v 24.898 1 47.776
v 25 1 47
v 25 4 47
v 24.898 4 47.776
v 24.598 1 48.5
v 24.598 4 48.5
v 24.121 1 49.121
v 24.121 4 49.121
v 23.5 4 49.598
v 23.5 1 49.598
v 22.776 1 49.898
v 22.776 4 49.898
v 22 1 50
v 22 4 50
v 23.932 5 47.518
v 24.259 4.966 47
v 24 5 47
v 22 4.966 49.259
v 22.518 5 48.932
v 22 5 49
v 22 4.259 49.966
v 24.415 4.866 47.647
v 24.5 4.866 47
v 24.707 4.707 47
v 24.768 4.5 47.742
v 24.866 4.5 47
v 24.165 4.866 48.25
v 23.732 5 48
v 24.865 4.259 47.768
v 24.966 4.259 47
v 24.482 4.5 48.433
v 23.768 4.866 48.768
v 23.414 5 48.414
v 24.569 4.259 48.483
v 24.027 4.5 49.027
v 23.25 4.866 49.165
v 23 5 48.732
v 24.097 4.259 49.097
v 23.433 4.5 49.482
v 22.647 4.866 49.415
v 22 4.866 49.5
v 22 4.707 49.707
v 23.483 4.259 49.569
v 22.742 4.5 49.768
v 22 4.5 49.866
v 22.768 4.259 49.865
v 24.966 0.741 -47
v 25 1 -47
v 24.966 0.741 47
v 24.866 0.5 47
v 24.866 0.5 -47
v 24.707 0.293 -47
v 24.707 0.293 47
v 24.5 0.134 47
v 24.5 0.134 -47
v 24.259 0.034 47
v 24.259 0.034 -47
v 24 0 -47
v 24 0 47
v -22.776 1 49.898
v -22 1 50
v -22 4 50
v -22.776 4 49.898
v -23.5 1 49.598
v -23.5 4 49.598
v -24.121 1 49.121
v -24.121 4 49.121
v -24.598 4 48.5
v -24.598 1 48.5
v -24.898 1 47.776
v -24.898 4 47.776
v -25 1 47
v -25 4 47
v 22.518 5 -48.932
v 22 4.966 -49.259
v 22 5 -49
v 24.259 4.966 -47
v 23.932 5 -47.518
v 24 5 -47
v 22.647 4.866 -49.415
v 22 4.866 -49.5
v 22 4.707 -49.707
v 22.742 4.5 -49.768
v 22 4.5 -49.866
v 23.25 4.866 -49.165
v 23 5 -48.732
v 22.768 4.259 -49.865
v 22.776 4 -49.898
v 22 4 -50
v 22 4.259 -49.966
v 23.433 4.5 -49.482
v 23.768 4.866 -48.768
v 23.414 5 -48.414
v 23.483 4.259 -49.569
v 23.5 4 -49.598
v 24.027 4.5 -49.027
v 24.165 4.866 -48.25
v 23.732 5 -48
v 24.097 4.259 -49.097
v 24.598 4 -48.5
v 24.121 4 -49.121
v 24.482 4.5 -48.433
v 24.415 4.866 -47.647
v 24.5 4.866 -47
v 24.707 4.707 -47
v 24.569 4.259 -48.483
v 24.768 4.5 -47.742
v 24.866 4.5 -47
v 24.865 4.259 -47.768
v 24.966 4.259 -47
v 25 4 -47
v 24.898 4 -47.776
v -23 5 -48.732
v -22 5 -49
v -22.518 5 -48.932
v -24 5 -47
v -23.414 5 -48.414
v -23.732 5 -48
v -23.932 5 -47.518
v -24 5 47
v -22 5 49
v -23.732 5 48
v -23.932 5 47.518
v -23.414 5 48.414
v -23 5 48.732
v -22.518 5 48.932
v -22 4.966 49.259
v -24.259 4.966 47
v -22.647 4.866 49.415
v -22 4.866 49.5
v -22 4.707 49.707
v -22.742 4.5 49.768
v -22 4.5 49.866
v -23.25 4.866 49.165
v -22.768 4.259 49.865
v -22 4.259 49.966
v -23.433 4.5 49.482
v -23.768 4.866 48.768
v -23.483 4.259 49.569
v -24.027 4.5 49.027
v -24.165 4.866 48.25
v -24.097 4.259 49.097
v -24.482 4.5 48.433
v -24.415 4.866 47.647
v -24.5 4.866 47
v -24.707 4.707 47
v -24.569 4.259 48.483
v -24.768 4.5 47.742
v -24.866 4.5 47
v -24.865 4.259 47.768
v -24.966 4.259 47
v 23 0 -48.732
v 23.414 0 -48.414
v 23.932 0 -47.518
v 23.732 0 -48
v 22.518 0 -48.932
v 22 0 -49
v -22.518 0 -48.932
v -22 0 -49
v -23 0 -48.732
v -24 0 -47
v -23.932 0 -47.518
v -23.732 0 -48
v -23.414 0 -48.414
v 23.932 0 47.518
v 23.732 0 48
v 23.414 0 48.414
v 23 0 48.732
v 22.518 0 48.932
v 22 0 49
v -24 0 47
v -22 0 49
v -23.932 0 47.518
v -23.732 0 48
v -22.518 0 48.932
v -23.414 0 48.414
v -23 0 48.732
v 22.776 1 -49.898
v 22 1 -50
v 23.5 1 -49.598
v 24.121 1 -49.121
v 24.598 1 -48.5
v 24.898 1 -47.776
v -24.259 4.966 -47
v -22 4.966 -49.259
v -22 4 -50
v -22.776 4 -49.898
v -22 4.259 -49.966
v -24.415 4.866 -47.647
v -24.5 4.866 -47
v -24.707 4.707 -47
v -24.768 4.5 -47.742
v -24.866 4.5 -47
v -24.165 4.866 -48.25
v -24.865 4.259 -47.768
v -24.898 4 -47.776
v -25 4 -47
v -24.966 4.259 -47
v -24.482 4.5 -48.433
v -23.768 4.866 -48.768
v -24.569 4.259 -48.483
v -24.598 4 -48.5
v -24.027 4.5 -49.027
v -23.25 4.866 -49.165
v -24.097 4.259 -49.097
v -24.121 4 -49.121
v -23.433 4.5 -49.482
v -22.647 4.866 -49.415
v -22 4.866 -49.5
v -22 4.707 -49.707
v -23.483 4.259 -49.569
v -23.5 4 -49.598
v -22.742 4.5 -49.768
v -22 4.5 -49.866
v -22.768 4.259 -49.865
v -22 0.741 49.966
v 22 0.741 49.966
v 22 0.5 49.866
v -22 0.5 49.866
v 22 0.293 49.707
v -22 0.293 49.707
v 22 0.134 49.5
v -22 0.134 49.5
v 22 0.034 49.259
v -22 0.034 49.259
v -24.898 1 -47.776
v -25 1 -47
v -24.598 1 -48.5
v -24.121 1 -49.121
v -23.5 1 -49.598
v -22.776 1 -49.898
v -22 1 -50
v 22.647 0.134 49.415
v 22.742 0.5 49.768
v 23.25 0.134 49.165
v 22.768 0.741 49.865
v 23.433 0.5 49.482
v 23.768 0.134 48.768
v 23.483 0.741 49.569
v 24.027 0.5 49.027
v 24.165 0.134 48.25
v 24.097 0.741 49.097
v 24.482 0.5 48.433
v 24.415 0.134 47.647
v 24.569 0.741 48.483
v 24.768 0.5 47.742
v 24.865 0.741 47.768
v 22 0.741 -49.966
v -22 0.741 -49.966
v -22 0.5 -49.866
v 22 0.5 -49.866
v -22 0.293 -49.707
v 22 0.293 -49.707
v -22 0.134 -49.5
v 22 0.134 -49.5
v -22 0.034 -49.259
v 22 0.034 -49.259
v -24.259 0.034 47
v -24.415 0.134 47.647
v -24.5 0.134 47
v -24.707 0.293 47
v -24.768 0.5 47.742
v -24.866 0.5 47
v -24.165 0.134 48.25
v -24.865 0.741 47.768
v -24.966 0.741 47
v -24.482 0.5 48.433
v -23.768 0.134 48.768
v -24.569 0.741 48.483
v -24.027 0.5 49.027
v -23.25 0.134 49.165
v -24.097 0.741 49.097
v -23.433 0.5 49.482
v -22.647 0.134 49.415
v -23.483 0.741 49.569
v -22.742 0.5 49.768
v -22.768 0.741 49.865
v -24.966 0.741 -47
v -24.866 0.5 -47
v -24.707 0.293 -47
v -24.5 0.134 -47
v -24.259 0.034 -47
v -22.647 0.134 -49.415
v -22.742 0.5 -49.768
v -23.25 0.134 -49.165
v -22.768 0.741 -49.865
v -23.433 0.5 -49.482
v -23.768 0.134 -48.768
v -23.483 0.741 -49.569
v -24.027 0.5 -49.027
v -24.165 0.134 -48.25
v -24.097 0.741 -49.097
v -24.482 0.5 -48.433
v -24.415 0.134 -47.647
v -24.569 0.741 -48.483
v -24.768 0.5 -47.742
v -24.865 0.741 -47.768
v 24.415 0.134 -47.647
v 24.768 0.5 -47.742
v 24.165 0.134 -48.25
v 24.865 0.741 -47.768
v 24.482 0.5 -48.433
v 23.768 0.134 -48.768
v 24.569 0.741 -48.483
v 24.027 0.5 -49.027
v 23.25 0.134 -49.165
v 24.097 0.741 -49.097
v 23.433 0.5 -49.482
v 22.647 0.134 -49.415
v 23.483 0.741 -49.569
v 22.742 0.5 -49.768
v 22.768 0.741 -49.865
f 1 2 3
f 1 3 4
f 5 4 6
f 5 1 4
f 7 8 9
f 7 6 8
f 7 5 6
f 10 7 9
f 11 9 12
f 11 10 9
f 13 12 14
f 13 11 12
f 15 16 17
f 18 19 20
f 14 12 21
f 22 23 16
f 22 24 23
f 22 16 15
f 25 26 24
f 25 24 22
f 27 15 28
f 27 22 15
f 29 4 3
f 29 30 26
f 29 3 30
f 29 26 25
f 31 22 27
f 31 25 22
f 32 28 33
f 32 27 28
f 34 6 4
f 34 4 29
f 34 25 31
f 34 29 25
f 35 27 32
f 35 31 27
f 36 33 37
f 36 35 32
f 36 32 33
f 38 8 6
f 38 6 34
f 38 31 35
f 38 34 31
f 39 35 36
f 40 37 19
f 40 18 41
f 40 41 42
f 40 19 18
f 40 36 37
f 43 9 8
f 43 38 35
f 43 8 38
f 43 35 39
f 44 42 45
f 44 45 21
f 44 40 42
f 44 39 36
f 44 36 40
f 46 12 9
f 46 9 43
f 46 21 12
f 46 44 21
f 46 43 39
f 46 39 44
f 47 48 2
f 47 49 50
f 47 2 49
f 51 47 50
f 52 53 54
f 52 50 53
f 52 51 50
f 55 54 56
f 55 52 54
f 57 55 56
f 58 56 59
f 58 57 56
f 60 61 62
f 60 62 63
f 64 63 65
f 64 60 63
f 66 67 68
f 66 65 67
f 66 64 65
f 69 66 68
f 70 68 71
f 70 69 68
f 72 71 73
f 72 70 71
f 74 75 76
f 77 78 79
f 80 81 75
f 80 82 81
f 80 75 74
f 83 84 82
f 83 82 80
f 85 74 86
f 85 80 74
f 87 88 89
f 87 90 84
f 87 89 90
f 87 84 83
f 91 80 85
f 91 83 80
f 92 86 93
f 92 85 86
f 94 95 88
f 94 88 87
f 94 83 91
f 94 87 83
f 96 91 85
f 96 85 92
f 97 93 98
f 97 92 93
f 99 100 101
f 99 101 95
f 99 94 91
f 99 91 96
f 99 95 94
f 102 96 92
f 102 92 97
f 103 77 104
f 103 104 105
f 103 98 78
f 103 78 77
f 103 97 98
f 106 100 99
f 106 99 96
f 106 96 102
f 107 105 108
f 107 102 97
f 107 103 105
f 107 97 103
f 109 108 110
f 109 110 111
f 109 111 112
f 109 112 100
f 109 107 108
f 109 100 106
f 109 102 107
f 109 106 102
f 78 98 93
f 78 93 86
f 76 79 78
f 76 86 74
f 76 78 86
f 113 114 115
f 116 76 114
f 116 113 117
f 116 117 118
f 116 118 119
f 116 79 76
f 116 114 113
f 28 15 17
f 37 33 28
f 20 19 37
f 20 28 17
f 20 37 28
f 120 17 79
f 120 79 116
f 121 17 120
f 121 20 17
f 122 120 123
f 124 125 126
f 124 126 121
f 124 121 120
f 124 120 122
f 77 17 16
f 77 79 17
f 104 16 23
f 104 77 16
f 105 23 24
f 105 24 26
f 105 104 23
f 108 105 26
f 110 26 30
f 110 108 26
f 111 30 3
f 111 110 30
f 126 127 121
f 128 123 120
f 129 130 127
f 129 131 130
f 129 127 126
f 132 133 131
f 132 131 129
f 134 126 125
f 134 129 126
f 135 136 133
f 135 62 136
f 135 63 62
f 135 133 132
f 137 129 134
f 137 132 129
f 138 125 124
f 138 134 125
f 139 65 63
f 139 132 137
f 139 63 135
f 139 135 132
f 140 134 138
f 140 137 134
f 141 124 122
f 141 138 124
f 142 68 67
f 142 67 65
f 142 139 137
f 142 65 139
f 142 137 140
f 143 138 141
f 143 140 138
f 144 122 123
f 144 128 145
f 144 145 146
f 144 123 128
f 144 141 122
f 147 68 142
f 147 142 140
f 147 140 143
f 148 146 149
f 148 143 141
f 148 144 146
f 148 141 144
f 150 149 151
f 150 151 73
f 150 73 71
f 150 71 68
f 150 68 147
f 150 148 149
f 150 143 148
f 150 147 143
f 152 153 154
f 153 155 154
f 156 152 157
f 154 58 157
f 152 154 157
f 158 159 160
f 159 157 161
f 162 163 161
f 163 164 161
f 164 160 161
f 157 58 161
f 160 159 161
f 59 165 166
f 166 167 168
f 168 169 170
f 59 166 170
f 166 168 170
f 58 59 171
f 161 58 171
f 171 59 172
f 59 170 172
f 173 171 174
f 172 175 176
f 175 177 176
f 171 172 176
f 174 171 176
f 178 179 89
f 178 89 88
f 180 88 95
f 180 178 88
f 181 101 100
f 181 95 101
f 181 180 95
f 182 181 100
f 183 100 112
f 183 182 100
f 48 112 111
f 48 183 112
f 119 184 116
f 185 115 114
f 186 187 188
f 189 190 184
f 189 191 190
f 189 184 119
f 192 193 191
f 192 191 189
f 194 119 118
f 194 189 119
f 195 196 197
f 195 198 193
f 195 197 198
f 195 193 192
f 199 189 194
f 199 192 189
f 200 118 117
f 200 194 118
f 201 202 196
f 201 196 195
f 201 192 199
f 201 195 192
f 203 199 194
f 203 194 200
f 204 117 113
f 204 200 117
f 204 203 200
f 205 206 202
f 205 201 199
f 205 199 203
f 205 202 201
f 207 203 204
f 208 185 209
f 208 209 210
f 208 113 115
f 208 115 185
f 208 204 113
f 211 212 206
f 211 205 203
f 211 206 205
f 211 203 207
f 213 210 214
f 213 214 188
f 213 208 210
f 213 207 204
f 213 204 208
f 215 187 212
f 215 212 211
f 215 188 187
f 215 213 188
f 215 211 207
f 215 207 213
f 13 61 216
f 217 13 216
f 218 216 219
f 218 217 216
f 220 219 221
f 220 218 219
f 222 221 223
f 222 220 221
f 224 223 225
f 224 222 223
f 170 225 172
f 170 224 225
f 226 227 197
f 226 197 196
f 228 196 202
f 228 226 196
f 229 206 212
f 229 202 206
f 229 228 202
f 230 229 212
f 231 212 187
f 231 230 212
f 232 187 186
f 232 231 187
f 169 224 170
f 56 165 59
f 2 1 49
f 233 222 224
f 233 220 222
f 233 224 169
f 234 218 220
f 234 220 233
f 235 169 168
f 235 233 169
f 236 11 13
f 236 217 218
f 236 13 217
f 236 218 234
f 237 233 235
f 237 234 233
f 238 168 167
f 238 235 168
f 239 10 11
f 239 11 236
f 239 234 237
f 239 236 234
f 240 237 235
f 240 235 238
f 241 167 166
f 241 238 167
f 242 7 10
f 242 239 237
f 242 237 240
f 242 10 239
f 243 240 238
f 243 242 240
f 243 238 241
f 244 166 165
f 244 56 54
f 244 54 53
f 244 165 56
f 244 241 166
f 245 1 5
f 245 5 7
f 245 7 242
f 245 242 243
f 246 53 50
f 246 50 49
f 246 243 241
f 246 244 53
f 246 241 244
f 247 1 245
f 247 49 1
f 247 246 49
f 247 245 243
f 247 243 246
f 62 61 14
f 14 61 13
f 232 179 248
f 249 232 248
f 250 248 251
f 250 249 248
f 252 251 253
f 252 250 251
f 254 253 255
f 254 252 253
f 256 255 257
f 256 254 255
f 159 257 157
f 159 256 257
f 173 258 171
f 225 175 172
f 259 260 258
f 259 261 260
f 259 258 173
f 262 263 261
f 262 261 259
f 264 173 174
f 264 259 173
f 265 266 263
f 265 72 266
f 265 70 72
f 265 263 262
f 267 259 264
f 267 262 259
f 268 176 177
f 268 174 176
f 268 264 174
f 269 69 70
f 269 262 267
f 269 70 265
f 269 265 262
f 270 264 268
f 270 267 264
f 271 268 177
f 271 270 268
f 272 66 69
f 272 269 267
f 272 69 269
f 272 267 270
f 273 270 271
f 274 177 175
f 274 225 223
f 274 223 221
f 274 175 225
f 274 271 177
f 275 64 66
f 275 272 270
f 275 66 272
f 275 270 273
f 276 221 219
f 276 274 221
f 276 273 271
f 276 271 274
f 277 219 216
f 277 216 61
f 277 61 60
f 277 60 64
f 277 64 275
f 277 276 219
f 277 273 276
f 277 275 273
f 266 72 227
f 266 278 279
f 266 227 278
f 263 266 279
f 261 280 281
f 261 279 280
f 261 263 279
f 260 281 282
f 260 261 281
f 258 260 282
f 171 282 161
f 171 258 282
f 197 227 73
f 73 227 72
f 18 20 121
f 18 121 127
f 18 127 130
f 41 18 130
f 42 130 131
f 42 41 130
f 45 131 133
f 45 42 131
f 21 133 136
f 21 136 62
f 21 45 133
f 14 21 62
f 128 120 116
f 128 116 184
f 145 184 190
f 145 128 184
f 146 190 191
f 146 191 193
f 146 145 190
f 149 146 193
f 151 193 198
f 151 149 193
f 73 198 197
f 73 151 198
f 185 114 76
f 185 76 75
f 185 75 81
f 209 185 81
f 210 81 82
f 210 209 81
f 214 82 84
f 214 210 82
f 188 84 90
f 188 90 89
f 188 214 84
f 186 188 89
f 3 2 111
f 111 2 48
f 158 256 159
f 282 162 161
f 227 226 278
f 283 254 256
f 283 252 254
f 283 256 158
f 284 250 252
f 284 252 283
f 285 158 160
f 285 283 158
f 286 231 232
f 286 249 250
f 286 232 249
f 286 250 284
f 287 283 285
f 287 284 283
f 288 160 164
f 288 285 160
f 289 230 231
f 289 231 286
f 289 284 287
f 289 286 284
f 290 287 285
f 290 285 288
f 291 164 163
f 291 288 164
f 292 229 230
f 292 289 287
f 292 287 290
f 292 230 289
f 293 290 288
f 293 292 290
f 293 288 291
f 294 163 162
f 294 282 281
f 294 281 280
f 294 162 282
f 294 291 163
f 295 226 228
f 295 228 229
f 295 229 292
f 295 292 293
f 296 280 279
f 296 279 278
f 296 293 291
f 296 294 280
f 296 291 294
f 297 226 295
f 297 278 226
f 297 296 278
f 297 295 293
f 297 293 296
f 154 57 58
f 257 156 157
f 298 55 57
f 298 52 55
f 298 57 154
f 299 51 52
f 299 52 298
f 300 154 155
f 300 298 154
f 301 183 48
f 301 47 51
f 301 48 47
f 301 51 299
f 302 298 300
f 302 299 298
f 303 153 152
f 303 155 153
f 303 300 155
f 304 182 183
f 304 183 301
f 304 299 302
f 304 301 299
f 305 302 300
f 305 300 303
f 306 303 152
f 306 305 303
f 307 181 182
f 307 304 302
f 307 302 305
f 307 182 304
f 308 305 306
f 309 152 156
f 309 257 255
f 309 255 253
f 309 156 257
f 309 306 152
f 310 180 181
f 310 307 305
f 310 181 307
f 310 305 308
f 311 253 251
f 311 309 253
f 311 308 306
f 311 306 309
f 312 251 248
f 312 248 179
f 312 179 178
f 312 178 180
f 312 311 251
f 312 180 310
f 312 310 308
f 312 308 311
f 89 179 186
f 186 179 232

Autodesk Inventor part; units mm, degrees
ref_plane "YZ Plane" through (0, 0, 0) normal (1, 0, 0) x (0, 1, 0)
ref_plane "XZ Plane" through (0, 0, 0) normal (0, 1, 0) x (-1, 0, 0)
ref_plane "XY Plane" through (0, 0, 0) normal (0, 0, 1) x (1, 0, 0)
sketch "Sketch1" plane through (0, 0, 0) normal (0, 1, 0) x (-1, 0, 0)
  line L0 (-25, -50) -> (25, -50)
  line L1 (25, -50) -> (25, 50)
  line L2 (25, 50) -> (-25, 50)
  line L3 (-25, 50) -> (-25, -50)
  line L4 (-25, -50) -> (25, 50) construction
  line L5 (25, -50) -> (-25, 50) construction
  point P0 (0, 0)
  dimension "d0" = 50
  dimension "d1" = 100
extrude "Extrusion1" add sketch "Sketch1" along normal blind 5
fillet "Fillet1" radius 1 8 edges at (0, 5, 50) (0, 0, 50) (0, 5, -50) (0, 0, -50) (25, 5, 0) (25, 0, 0) (-25, 5, 0) (-25, 0, 0)
fillet "Fillet2" radius 3 12 edges at (24.7071, 4.7071, -49.7071) (24.7071, 0.2929, -49.7071) (25, 2.5, -50) (-24.7071, 4.7071, -49.7071) (-24.7071, 0.2929, -49.7071) (-25, 2.5, -50) (-24.7071, 4.7071, 49.7071) (-24.7071, 0.2929, 49.7071) (-25, 2.5, 50) (24.7071, 4.7071, 49.7071) (24.7071, 0.2929, 49.7071) (25, 2.5, 50)
properties part number "battery-5050100_4000" material "PC/ABS Plastic"
